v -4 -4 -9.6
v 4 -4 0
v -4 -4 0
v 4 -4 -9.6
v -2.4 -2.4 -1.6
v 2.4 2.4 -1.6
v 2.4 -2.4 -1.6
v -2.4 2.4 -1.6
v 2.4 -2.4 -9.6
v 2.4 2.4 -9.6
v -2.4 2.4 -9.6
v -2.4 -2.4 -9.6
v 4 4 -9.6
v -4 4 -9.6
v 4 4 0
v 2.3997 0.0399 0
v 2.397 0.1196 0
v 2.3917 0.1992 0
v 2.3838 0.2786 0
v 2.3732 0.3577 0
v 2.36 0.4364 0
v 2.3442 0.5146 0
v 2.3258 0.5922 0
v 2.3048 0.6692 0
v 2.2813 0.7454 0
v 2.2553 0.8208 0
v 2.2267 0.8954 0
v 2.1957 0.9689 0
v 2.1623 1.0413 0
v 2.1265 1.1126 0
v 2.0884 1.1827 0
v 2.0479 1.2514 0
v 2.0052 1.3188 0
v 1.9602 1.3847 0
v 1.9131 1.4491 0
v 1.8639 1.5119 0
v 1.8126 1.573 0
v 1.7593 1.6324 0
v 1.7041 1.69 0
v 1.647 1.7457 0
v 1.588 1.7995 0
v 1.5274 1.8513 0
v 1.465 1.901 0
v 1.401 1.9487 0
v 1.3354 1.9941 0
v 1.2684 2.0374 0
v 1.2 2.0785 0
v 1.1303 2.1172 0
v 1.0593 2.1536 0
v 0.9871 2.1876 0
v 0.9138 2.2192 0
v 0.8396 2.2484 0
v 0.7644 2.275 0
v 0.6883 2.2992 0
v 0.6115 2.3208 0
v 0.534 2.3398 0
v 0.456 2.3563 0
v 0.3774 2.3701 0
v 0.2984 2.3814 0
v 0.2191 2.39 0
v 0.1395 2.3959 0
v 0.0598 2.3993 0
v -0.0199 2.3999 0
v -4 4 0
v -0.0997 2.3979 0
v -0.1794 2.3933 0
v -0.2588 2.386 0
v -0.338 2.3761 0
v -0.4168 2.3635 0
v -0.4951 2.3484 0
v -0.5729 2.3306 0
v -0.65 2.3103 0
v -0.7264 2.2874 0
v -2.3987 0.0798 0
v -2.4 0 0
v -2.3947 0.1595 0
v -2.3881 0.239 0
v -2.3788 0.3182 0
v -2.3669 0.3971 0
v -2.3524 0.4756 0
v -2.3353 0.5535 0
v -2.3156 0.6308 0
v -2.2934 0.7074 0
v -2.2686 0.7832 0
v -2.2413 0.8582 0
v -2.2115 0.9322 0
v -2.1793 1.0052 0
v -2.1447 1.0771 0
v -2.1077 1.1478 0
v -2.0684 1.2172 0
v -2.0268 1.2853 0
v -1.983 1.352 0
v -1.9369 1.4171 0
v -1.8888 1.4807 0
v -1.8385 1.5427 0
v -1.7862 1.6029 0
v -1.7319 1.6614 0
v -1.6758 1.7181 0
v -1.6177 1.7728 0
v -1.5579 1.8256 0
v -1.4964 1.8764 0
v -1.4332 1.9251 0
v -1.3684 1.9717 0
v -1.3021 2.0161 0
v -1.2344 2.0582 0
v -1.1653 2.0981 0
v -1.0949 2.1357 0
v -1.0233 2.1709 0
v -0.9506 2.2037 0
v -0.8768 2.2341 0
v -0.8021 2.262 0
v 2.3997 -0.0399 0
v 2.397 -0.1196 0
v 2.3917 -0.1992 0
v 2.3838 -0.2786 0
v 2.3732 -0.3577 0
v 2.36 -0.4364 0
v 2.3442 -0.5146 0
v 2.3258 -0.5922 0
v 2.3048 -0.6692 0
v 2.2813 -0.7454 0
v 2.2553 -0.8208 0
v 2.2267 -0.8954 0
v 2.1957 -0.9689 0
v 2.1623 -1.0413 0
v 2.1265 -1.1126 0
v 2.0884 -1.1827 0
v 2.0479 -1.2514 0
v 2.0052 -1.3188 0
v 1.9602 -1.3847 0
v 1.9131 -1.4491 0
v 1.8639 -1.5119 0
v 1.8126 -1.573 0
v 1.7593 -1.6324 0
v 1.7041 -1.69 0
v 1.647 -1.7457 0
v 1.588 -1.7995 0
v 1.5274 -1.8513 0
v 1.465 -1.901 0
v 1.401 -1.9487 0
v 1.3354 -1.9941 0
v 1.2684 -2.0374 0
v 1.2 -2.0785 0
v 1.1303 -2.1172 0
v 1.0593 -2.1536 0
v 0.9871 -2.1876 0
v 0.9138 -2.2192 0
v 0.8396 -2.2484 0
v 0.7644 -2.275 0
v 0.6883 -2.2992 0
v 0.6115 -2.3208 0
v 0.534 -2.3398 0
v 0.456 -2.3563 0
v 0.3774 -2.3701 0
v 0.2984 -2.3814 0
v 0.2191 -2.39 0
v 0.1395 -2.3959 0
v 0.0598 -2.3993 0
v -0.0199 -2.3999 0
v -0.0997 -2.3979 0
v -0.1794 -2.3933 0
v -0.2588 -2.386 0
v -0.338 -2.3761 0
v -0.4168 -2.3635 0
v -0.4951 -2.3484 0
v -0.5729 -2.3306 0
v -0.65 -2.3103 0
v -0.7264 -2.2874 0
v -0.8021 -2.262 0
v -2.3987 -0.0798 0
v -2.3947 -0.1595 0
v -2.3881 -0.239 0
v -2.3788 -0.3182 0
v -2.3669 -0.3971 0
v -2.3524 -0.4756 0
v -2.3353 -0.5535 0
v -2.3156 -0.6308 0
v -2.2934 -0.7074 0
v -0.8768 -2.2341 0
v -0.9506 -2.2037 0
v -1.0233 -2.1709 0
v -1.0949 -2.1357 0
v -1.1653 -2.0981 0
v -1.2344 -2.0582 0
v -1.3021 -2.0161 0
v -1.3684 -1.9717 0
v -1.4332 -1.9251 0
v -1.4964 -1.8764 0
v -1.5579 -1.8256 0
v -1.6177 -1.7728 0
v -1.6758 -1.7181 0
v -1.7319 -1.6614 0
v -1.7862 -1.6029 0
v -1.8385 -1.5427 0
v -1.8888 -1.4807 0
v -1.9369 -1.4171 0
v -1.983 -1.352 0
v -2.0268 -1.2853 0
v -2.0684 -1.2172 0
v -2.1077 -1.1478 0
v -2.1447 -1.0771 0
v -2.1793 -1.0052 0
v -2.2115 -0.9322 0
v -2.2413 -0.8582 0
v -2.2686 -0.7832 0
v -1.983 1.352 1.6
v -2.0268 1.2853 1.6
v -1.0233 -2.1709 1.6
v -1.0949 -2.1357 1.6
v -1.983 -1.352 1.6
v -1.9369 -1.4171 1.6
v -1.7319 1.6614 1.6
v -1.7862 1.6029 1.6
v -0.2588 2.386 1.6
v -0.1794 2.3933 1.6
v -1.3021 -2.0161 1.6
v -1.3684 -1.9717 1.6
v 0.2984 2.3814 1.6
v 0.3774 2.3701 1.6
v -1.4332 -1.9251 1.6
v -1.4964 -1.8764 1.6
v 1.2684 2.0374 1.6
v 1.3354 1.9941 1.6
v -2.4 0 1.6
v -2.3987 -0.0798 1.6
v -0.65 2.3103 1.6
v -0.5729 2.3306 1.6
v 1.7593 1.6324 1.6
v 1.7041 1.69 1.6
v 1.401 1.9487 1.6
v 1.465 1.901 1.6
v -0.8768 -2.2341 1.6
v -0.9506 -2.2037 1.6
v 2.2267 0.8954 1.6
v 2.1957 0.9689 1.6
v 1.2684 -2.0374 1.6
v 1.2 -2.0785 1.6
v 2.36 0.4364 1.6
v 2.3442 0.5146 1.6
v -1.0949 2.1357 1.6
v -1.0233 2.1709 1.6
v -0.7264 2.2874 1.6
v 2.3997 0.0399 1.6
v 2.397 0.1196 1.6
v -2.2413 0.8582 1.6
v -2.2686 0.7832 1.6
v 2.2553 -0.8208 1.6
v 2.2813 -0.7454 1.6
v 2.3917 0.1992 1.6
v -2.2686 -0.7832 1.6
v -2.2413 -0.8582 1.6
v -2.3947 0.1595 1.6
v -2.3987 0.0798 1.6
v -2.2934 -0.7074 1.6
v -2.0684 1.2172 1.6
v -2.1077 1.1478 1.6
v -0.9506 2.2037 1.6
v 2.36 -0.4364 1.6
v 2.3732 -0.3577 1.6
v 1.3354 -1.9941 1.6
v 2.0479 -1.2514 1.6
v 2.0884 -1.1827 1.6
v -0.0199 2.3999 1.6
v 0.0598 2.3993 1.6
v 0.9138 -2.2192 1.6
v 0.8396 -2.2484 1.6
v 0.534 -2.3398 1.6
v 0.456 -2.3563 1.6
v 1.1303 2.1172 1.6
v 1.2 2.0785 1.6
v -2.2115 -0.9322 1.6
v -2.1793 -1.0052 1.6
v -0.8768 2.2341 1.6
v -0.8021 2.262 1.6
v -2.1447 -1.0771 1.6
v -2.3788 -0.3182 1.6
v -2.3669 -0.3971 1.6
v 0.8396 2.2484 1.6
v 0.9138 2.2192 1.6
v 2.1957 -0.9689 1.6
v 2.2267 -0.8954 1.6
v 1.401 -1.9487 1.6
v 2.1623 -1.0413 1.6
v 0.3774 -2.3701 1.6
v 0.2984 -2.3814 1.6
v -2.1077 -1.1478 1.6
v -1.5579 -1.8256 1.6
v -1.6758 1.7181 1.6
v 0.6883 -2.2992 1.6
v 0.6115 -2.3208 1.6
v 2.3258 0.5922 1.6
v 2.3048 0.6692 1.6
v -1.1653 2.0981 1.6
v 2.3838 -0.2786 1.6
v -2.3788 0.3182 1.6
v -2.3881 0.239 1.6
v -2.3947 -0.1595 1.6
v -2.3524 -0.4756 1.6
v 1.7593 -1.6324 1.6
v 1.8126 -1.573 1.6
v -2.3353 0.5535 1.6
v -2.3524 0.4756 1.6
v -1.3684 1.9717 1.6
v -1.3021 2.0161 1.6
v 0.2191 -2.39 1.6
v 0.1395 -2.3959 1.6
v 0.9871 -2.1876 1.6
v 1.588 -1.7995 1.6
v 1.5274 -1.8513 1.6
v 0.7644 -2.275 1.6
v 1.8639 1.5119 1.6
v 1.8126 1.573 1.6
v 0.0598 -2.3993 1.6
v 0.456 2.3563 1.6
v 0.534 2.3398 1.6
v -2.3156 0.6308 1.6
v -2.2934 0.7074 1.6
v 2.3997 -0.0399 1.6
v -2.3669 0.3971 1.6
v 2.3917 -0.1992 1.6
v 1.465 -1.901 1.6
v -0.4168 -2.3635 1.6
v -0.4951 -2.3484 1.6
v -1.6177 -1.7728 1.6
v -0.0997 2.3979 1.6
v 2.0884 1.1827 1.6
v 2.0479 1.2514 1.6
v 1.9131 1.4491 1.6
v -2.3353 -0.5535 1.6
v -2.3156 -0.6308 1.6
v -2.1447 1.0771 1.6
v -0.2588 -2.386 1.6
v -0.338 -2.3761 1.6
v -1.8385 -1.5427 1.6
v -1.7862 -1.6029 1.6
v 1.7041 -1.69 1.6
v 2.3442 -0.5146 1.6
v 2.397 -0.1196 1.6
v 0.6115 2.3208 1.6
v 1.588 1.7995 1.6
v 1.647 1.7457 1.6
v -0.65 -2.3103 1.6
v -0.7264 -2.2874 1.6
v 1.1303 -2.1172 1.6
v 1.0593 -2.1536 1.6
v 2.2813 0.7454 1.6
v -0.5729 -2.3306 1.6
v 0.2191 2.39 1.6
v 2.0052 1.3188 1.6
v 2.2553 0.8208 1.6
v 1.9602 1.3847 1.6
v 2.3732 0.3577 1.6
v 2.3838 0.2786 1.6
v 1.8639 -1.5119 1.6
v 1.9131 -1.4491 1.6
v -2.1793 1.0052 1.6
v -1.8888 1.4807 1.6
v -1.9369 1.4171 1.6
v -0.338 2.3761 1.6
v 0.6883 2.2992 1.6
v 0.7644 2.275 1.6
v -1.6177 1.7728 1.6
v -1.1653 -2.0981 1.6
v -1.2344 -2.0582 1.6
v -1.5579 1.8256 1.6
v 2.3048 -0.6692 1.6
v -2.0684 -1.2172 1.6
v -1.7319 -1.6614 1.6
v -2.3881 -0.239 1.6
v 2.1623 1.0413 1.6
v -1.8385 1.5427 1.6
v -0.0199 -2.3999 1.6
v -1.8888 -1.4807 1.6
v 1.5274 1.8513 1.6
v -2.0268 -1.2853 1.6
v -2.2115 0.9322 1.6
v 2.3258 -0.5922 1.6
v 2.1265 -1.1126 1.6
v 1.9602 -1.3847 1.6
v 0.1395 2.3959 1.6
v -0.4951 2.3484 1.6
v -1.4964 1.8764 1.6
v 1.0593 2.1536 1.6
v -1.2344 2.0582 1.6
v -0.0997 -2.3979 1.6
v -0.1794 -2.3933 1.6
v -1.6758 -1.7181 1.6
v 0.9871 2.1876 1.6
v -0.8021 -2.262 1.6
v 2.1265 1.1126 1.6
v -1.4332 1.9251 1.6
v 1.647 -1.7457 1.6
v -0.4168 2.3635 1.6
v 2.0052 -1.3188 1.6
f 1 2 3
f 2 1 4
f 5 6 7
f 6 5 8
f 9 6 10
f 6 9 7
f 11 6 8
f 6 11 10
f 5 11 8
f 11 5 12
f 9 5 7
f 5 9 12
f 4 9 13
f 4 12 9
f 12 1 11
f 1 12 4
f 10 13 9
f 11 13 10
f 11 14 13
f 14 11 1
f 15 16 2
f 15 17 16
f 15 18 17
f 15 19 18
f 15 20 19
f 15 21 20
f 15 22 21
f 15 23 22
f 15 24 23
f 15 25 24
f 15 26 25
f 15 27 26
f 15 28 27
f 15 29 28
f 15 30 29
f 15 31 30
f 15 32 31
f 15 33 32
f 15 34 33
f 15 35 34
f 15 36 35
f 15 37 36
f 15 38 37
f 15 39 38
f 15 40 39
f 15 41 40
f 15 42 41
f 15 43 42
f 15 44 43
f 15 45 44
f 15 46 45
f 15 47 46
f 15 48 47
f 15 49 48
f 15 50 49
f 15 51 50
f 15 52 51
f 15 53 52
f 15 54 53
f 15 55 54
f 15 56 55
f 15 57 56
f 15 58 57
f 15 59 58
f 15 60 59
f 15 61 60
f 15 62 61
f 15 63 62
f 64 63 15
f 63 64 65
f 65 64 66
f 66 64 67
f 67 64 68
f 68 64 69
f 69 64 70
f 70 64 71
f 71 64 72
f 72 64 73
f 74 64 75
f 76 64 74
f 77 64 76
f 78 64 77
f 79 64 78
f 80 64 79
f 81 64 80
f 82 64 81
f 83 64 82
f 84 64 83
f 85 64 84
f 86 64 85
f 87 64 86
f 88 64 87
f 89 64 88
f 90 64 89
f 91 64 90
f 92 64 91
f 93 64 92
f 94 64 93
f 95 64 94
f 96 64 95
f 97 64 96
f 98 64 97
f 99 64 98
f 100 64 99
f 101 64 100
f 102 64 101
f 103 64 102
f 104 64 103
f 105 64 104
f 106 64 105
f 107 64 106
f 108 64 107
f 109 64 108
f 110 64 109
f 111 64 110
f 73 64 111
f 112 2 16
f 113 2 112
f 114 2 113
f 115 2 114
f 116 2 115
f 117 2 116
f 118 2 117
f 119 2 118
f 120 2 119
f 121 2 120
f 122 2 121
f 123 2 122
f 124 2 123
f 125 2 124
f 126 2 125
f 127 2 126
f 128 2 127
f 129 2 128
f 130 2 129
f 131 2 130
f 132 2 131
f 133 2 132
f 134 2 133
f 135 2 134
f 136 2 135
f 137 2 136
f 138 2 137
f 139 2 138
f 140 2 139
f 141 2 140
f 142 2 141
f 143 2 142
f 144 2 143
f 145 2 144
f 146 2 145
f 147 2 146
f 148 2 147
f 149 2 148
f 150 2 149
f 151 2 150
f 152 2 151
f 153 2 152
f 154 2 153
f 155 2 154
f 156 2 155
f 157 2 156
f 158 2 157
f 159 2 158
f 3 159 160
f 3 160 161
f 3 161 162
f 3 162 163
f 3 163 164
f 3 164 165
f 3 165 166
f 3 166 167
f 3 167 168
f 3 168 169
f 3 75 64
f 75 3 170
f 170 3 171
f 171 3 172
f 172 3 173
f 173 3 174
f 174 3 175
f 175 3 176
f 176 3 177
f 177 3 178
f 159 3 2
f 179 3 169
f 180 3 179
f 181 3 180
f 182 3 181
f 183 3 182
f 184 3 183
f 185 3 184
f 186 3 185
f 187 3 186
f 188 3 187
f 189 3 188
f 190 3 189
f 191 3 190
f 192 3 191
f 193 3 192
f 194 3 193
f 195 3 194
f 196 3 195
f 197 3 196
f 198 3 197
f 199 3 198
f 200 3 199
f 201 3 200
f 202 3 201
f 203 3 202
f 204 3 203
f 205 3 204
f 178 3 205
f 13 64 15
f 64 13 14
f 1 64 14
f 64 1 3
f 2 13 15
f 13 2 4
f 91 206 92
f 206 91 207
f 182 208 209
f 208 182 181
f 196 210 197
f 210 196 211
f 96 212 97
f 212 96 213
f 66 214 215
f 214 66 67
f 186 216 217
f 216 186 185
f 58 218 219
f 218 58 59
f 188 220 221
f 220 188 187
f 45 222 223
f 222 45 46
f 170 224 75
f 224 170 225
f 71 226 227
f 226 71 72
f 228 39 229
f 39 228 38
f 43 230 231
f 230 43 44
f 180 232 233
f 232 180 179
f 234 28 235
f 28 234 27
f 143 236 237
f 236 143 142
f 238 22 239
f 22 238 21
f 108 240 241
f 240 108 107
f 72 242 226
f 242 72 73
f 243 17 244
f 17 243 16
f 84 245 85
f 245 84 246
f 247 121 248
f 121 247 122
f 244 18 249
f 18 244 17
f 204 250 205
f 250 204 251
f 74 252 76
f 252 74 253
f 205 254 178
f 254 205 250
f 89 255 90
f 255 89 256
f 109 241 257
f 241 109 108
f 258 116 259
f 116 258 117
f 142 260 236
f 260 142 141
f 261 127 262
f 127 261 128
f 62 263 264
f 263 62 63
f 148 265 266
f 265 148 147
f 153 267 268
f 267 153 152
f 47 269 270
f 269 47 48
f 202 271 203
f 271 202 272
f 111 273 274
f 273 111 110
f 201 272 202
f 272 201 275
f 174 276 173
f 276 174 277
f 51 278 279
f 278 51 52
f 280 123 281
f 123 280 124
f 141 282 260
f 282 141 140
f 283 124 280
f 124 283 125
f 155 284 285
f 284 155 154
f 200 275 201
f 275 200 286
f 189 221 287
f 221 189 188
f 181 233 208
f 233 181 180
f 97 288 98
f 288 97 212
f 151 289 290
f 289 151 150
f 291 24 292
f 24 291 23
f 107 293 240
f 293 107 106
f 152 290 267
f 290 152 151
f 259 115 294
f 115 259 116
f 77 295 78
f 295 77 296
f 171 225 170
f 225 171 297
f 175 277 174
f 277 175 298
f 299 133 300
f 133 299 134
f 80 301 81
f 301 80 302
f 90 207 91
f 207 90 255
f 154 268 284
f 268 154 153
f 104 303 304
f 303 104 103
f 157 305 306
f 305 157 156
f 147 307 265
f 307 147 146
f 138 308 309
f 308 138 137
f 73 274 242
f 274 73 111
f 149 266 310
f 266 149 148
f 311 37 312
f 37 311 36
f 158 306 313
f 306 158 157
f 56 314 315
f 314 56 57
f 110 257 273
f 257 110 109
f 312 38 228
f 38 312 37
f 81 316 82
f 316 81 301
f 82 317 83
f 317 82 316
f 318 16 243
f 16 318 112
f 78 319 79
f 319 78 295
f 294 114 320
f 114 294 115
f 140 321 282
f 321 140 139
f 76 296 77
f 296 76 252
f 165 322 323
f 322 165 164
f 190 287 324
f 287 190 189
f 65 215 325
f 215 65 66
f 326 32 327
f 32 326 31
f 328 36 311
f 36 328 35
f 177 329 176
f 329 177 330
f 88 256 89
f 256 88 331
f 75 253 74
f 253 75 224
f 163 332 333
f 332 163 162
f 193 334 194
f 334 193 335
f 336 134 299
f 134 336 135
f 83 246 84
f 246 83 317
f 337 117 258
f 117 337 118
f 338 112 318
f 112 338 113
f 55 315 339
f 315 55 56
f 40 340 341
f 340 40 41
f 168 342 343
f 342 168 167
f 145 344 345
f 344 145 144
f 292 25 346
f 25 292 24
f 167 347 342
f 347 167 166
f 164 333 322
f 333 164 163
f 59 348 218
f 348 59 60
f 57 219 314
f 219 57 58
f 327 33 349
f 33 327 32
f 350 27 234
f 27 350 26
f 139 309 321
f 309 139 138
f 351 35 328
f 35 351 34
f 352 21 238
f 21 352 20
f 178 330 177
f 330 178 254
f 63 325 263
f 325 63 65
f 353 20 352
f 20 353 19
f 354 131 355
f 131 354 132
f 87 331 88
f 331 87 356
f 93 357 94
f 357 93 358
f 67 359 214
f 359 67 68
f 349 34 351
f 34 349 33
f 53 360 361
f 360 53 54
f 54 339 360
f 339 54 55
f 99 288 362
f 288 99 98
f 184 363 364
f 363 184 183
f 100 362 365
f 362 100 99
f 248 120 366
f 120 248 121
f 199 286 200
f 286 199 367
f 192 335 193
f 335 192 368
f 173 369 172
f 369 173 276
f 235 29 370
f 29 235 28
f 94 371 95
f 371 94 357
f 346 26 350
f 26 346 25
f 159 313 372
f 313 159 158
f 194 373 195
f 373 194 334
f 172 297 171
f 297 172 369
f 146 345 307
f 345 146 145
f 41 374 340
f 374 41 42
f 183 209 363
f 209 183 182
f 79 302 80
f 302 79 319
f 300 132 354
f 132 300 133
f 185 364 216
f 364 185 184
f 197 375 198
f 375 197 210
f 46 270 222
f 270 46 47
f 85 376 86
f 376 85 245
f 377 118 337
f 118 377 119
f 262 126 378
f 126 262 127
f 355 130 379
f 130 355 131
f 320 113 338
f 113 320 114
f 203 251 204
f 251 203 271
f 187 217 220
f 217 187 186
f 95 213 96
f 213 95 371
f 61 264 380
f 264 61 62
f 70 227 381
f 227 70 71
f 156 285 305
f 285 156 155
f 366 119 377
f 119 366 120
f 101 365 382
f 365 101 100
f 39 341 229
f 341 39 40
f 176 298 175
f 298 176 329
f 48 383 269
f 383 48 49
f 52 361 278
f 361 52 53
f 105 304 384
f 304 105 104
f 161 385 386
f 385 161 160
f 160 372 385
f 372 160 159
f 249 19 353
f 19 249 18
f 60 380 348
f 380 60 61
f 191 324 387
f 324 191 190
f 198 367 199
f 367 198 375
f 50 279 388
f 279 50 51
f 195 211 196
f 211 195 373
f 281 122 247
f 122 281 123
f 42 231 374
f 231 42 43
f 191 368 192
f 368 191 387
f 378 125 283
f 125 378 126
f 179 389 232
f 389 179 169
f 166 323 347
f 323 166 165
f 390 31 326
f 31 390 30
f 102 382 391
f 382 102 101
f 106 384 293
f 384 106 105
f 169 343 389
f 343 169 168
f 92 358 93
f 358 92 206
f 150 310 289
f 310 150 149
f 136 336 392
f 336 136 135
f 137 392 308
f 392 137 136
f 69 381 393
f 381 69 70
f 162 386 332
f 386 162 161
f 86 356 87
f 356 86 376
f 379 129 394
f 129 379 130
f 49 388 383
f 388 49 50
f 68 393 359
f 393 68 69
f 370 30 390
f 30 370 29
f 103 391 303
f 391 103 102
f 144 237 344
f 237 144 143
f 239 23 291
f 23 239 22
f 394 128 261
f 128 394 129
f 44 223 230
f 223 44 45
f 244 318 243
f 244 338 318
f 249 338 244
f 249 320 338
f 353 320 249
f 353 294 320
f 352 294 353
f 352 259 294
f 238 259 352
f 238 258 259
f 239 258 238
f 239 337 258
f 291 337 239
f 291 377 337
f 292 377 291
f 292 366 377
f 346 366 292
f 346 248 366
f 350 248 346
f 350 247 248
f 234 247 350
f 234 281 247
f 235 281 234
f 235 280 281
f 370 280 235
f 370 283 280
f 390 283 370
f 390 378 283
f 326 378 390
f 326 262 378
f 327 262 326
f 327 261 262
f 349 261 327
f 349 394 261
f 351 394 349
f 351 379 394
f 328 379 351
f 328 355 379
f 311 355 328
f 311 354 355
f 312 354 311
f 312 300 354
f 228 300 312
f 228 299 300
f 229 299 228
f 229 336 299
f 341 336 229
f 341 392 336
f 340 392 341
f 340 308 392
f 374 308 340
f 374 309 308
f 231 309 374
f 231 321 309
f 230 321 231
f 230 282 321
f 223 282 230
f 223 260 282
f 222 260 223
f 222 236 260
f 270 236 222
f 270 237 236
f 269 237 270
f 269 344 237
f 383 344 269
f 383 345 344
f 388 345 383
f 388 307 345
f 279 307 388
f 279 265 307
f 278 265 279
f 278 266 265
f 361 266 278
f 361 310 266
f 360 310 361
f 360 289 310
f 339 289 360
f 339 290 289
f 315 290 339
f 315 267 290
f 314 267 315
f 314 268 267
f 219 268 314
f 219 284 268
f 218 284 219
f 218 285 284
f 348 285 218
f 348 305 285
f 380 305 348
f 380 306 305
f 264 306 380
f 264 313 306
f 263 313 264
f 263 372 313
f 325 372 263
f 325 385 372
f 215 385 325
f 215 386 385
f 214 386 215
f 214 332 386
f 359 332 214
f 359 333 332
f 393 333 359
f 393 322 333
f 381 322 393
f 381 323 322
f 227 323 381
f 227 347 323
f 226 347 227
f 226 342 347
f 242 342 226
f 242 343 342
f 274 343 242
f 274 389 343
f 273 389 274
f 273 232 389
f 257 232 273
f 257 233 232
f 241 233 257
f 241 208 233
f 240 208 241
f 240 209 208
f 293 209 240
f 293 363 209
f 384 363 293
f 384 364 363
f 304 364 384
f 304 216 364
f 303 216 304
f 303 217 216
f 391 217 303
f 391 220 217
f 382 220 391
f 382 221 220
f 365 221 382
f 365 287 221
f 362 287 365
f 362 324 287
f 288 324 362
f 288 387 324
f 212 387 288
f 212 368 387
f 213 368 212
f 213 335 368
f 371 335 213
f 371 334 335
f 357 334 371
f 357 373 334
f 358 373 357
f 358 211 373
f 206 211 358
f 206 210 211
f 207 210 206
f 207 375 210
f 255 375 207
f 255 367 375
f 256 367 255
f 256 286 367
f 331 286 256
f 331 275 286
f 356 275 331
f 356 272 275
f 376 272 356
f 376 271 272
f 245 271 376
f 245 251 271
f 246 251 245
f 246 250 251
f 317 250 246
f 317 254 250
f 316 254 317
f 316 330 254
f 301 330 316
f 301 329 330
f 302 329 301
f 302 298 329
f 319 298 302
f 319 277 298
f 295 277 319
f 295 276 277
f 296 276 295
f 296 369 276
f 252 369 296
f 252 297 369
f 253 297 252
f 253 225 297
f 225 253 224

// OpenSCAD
// file: ../p/stud3.scad
use <../lib.scad>
use <4-4cyli.scad>
use <4-4disc.scad>
use <4-4edge.scad>
$fa=1; $fs=0.2;
function ldraw_lib__stud3(realsolid=false) = realsolid ? 
    [openscad(translate([0,0,-eps()], o=cylinder(4+eps(), r=4)),2)] : [
// 0 Stud Tube Solid
// 0 Name: stud3.dat
// 0 Author: James Jessiman
// 0 !LDRAW_ORG Primitive UPDATE 2012-01
// 0 !LICENSE Licensed under CC BY 2.0 and CC BY 4.0 : see CAreadme.txt
// 
// 0 BFC CERTIFY CCW
  [0,"BFC","CERTIFY"],
  [0,"BFC","CCW"],
// 
// 0 !HISTORY 2002-04-04 [sbliss] Modified for BFC compliance
// 0 !HISTORY 2002-04-25 [PTadmin] Official Update 2002-02
// 0 !HISTORY 2007-06-24 [PTadmin] Header formatted for Contributor Agreement
// 0 !HISTORY 2008-07-01 [PTadmin] Official Update 2008-01
// 0 !HISTORY 2012-02-16 [Philo] Changed to CCW
// 0 !HISTORY 2012-03-30 [PTadmin] Official Update 2012-01
// 
// 
// 1 16 0 -4 0 4 0 0 0 1 0 0 0 4 4-4edge.dat
  [1,16,0,-4,0,4,0,0,0,1,0,0,0,4, ldraw_lib__4_4edge(realsolid)],
// 1 16 0 0 0 4 0 0 0 1 0 0 0 4 4-4edge.dat
  [1,16,0,0,0,4,0,0,0,1,0,0,0,4, ldraw_lib__4_4edge(realsolid)],
// 1 16 0 -4 0 4 0 0 0 1 0 0 0 4 4-4disc.dat
  [1,16,0,-4,0,4,0,0,0,1,0,0,0,4, ldraw_lib__4_4disc(realsolid)],
// 1 16 0 -4 0 4 0 0 0 4 0 0 0 4 4-4cyli.dat
  [1,16,0,-4,0,4,0,0,0,4,0,0,0,4, ldraw_lib__4_4cyli(realsolid)],
];
module ldraw_lib__stud3(step=0, col=false, unit=2/5, alt=false, line=0.2, solid=!$preview)
    makepoly(ldraw_lib__stud3(solid), step=step, col=col, unit=unit, alt=alt, line=line, solid=solid);
ldraw_lib__stud3(line=0.2);
// file: ../p/4-4edge.scad
use <../lib.scad>
$fa=1; $fs=0.2;
function ldraw_lib__4_4edge(realsolid=false) = [
// 0 Circle 1.0
// 0 Name: 4-4edge.dat
// 0 Author: James Jessiman
// 0 !LDRAW_ORG Primitive UPDATE 2017-01
// 0 !LICENSE Licensed under CC BY 2.0 and CC BY 4.0 : see CAreadme.txt
// 
// 0 BFC CERTIFY CCW
  [0,"BFC","CERTIFY"],
  [0,"BFC","CCW"],
// 
// 0 !HISTORY 1998-12-15 [PTadmin] Official Update 1998-10
// 0 !HISTORY 2005-12-28 [PTadmin] Official Update 2005-01
// 0 !HISTORY 2007-06-24 [PTadmin] Header formatted for Contributor Agreement
// 0 !HISTORY 2008-07-01 [PTadmin] Official Update 2008-01
// 0 !HISTORY 2017-01-15 [Steffen] BFCed
// 0 !HISTORY 2017-12-30 [PTadmin] Official Update 2017-01
// 
// 
// 2 24 1 0 0 0.9239 0 0.3827
  [2,24,1,0,0,0.9239,0,0.3827],
// 2 24 0.9239 0 0.3827 0.7071 0 0.7071
  [2,24,0.9239,0,0.3827,0.7071,0,0.7071],
// 2 24 0.7071 0 0.7071 0.3827 0 0.9239
  [2,24,0.7071,0,0.7071,0.3827,0,0.9239],
// 2 24 0.3827 0 0.9239 0 0 1
  [2,24,0.3827,0,0.9239,0,0,1],
// 2 24 0 0 1 -0.3827 0 0.9239
  [2,24,0,0,1,-0.3827,0,0.9239],
// 2 24 -0.3827 0 0.9239 -0.7071 0 0.7071
  [2,24,-0.3827,0,0.9239,-0.7071,0,0.7071],
// 2 24 -0.7071 0 0.7071 -0.9239 0 0.3827
  [2,24,-0.7071,0,0.7071,-0.9239,0,0.3827],
// 2 24 -0.9239 0 0.3827 -1 0 -0
  [2,24,-0.9239,0,0.3827,-1,0,-0],
// 2 24 -1 0 -0 -0.9239 0 -0.3827
  [2,24,-1,0,-0,-0.9239,0,-0.3827],
// 2 24 -0.9239 0 -0.3827 -0.7071 0 -0.7071
  [2,24,-0.9239,0,-0.3827,-0.7071,0,-0.7071],
// 2 24 -0.7071 0 -0.7071 -0.3827 0 -0.9239
  [2,24,-0.7071,0,-0.7071,-0.3827,0,-0.9239],
// 2 24 -0.3827 0 -0.9239 0 0 -1
  [2,24,-0.3827,0,-0.9239,0,0,-1],
// 2 24 0 0 -1 0.3827 0 -0.9239
  [2,24,0,0,-1,0.3827,0,-0.9239],
// 2 24 0.3827 0 -0.9239 0.7071 0 -0.7071
  [2,24,0.3827,0,-0.9239,0.7071,0,-0.7071],
// 2 24 0.7071 0 -0.7071 0.9239 0 -0.3827
  [2,24,0.7071,0,-0.7071,0.9239,0,-0.3827],
// 2 24 0.9239 0 -0.3827 1 0 0
  [2,24,0.9239,0,-0.3827,1,0,0],
];
module ldraw_lib__4_4edge(step=0, col=false, unit=2/5, alt=false, line=0.2, solid=!$preview)
    makepoly(ldraw_lib__4_4edge(solid), step=step, col=col, unit=unit, alt=alt, line=line, solid=solid);
ldraw_lib__4_4edge(line=0.2);
// file: ../p/4-4disc.scad
use <../lib.scad>
$fa=1; $fs=0.2;
function ldraw_lib__4_4disc(realsolid=false) = [
// 0 Disc 1.0
// 0 Name: 4-4disc.dat
// 0 Author: James Jessiman
// 0 !LDRAW_ORG Primitive UPDATE 2002-02
// 0 !LICENSE Licensed under CC BY 2.0 and CC BY 4.0 : see CAreadme.txt
// 
// 0 BFC CERTIFY CCW
  [0,"BFC","CERTIFY"],
  [0,"BFC","CCW"],
// 
// 0 !HISTORY 1998-12-15 [PTadmin] Official Update 1998-10
// 0 !HISTORY 2002-03-23 [sbliss] Added BFC statement
// 0 !HISTORY 2002-04-25 [PTadmin] Official Update 2002-02
// 0 !HISTORY 2007-06-24 [PTadmin] Header formatted for Contributor Agreement
// 0 !HISTORY 2008-07-01 [PTadmin] Official Update 2008-01
// 
// 
// 3 16 0 0 0 1 0 0 0.9239 0 0.3827
  [3,16,0,0,0,1,0,0,0.9239,0,0.3827],
// 3 16 0 0 0 0.9239 0 0.3827 0.7071 0 0.7071
  [3,16,0,0,0,0.9239,0,0.3827,0.7071,0,0.7071],
// 3 16 0 0 0 0.7071 0 0.7071 0.3827 0 0.9239
  [3,16,0,0,0,0.7071,0,0.7071,0.3827,0,0.9239],
// 3 16 0 0 0 0.3827 0 0.9239 0 0 1
  [3,16,0,0,0,0.3827,0,0.9239,0,0,1],
// 3 16 0 0 0 0 0 1 -0.3827 0 0.9239
  [3,16,0,0,0,0,0,1,-0.3827,0,0.9239],
// 3 16 0 0 0 -0.3827 0 0.9239 -0.7071 0 0.7071
  [3,16,0,0,0,-0.3827,0,0.9239,-0.7071,0,0.7071],
// 3 16 0 0 0 -0.7071 0 0.7071 -0.9239 0 0.3827
  [3,16,0,0,0,-0.7071,0,0.7071,-0.9239,0,0.3827],
// 3 16 0 0 0 -0.9239 0 0.3827 -1 0 -0
  [3,16,0,0,0,-0.9239,0,0.3827,-1,0,-0],
// 3 16 0 0 0 -1 0 -0 -0.9239 0 -0.3827
  [3,16,0,0,0,-1,0,-0,-0.9239,0,-0.3827],
// 3 16 0 0 0 -0.9239 0 -0.3827 -0.7071 0 -0.7071
  [3,16,0,0,0,-0.9239,0,-0.3827,-0.7071,0,-0.7071],
// 3 16 0 0 0 -0.7071 0 -0.7071 -0.3827 0 -0.9239
  [3,16,0,0,0,-0.7071,0,-0.7071,-0.3827,0,-0.9239],
// 3 16 0 0 0 -0.3827 0 -0.9239 0 0 -1
  [3,16,0,0,0,-0.3827,0,-0.9239,0,0,-1],
// 3 16 0 0 0 0 0 -1 0.3827 0 -0.9239
  [3,16,0,0,0,0,0,-1,0.3827,0,-0.9239],
// 3 16 0 0 0 0.3827 0 -0.9239 0.7071 0 -0.7071
  [3,16,0,0,0,0.3827,0,-0.9239,0.7071,0,-0.7071],
// 3 16 0 0 0 0.7071 0 -0.7071 0.9239 0 -0.3827
  [3,16,0,0,0,0.7071,0,-0.7071,0.9239,0,-0.3827],
// 3 16 0 0 0 0.9239 0 -0.3827 1 0 0
  [3,16,0,0,0,0.9239,0,-0.3827,1,0,0],
// 0
];
module ldraw_lib__4_4disc(step=0, col=false, unit=2/5, alt=false, line=0.2, solid=!$preview)
    makepoly(ldraw_lib__4_4disc(solid), step=step, col=col, unit=unit, alt=alt, line=line, solid=solid);
ldraw_lib__4_4disc(line=0.2);
// file: ../p/4-4cyli.scad
use <../lib.scad>
$fa=1; $fs=0.2;
function ldraw_lib__4_4cyli(realsolid=false) = [
// 0 Cylinder 1.0
// 0 Name: 4-4cyli.dat
// 0 Author: James Jessiman
// 0 !LDRAW_ORG Primitive UPDATE 2005-01
// 0 !LICENSE Licensed under CC BY 2.0 and CC BY 4.0 : see CAreadme.txt
// 
// 0 BFC CERTIFY CCW
  [0,"BFC","CERTIFY"],
  [0,"BFC","CCW"],
// 
// 0 !HISTORY 1998-12-15 [PTadmin] Official Update 1998-10
// 0 !HISTORY 2002-03-23 [sbliss] Added BFC statement; merged headers from files in distributions LDraw 0.27 and Complete.
// 0 !HISTORY 2002-04-25 [PTadmin] Official Update 2002-02
// 0 !HISTORY 2004-12-14 [guyvivan] BFC CCW
// 0 !HISTORY 2005-12-28 [PTadmin] Official Update 2005-01
// 0 !HISTORY 2007-06-24 [PTadmin] Header formatted for Contributor Agreement
// 0 !HISTORY 2008-07-01 [PTadmin] Official Update 2008-01
// 
// 
// 4 16 1 1 0 0.9239 1 0.3827 0.9239 0 0.3827 1 0 0
  [4,16,1,1,0,0.9239,1,0.3827,0.9239,0,0.3827,1,0,0],
// 5 24 1 0 0 1 1 0 0.9239 0 0.3827 0.9239 0 -0.3827
  [5,24,1,0,0,1,1,0,0.9239,0,0.3827,0.9239,0,-0.3827],
// 4 16 0.9239 1 0.3827 0.7071 1 0.7071 0.7071 0 0.7071 0.9239 0 0.3827
  [4,16,0.9239,1,0.3827,0.7071,1,0.7071,0.7071,0,0.7071,0.9239,0,0.3827],
// 5 24 0.9239 0 0.3827 0.9239 1 0.3827 0.7071 0 0.7071 1 0 0
  [5,24,0.9239,0,0.3827,0.9239,1,0.3827,0.7071,0,0.7071,1,0,0],
// 4 16 0.7071 1 0.7071 0.3827 1 0.9239 0.3827 0 0.9239 0.7071 0 0.7071
  [4,16,0.7071,1,0.7071,0.3827,1,0.9239,0.3827,0,0.9239,0.7071,0,0.7071],
// 5 24 0.7071 0 0.7071 0.7071 1 0.7071 0.3827 0 0.9239 0.9239 0 0.3827
  [5,24,0.7071,0,0.7071,0.7071,1,0.7071,0.3827,0,0.9239,0.9239,0,0.3827],
// 4 16 0.3827 1 0.9239 0 1 1 0 0 1 0.3827 0 0.9239
  [4,16,0.3827,1,0.9239,0,1,1,0,0,1,0.3827,0,0.9239],
// 5 24 0.3827 0 0.9239 0.3827 1 0.9239 0 0 1 0.7071 0 0.7071
  [5,24,0.3827,0,0.9239,0.3827,1,0.9239,0,0,1,0.7071,0,0.7071],
// 4 16 0 1 1 -0.3827 1 0.9239 -0.3827 0 0.9239 0 0 1
  [4,16,0,1,1,-0.3827,1,0.9239,-0.3827,0,0.9239,0,0,1],
// 5 24 0 0 1 0 1 1 -0.3827 0 0.9239 0.3827 0 0.9239
  [5,24,0,0,1,0,1,1,-0.3827,0,0.9239,0.3827,0,0.9239],
// 4 16 -0.3827 1 0.9239 -0.7071 1 0.7071 -0.7071 0 0.7071 -0.3827 0 0.9239
  [4,16,-0.3827,1,0.9239,-0.7071,1,0.7071,-0.7071,0,0.7071,-0.3827,0,0.9239],
// 5 24 -0.3827 0 0.9239 -0.3827 1 0.9239 -0.7071 0 0.7071 0 0 1
  [5,24,-0.3827,0,0.9239,-0.3827,1,0.9239,-0.7071,0,0.7071,0,0,1],
// 4 16 -0.7071 1 0.7071 -0.9239 1 0.3827 -0.9239 0 0.3827 -0.7071 0 0.7071
  [4,16,-0.7071,1,0.7071,-0.9239,1,0.3827,-0.9239,0,0.3827,-0.7071,0,0.7071],
// 5 24 -0.7071 0 0.7071 -0.7071 1 0.7071 -0.9239 0 0.3827 -0.3827 0 0.9239
  [5,24,-0.7071,0,0.7071,-0.7071,1,0.7071,-0.9239,0,0.3827,-0.3827,0,0.9239],
// 4 16 -0.9239 1 0.3827 -1 1 0 -1 0 0 -0.9239 0 0.3827
  [4,16,-0.9239,1,0.3827,-1,1,0,-1,0,0,-0.9239,0,0.3827],
// 5 24 -0.9239 0 0.3827 -0.9239 1 0.3827 -1 0 0 -0.7071 0 0.7071
  [5,24,-0.9239,0,0.3827,-0.9239,1,0.3827,-1,0,0,-0.7071,0,0.7071],
// 4 16 -1 1 0 -0.9239 1 -0.3827 -0.9239 0 -0.3827 -1 0 0
  [4,16,-1,1,0,-0.9239,1,-0.3827,-0.9239,0,-0.3827,-1,0,0],
// 5 24 -1 0 0 -1 1 0 -0.9239 0 -0.3827 -0.9239 0 0.3827
  [5,24,-1,0,0,-1,1,0,-0.9239,0,-0.3827,-0.9239,0,0.3827],
// 4 16 -0.9239 1 -0.3827 -0.7071 1 -0.7071 -0.7071 0 -0.7071 -0.9239 0 -0.3827
  [4,16,-0.9239,1,-0.3827,-0.7071,1,-0.7071,-0.7071,0,-0.7071,-0.9239,0,-0.3827],
// 5 24 -0.9239 0 -0.3827 -0.9239 1 -0.3827 -0.7071 0 -0.7071 -1 0 0
  [5,24,-0.9239,0,-0.3827,-0.9239,1,-0.3827,-0.7071,0,-0.7071,-1,0,0],
// 4 16 -0.7071 1 -0.7071 -0.3827 1 -0.9239 -0.3827 0 -0.9239 -0.7071 0 -0.7071
  [4,16,-0.7071,1,-0.7071,-0.3827,1,-0.9239,-0.3827,0,-0.9239,-0.7071,0,-0.7071],
// 5 24 -0.7071 0 -0.7071 -0.7071 1 -0.7071 -0.3827 0 -0.9239 -0.9239 0 -0.3827
  [5,24,-0.7071,0,-0.7071,-0.7071,1,-0.7071,-0.3827,0,-0.9239,-0.9239,0,-0.3827],
// 4 16 -0.3827 1 -0.9239 0 1 -1 0 0 -1 -0.3827 0 -0.9239
  [4,16,-0.3827,1,-0.9239,0,1,-1,0,0,-1,-0.3827,0,-0.9239],
// 5 24 -0.3827 0 -0.9239 -0.3827 1 -0.9239 0 0 -1 -0.7071 0 -0.7071
  [5,24,-0.3827,0,-0.9239,-0.3827,1,-0.9239,0,0,-1,-0.7071,0,-0.7071],
// 4 16 0 1 -1 0.3827 1 -0.9239 0.3827 0 -0.9239 0 0 -1
  [4,16,0,1,-1,0.3827,1,-0.9239,0.3827,0,-0.9239,0,0,-1],
// 5 24 0 0 -1 0 1 -1 0.3827 0 -0.9239 -0.3827 0 -0.9239
  [5,24,0,0,-1,0,1,-1,0.3827,0,-0.9239,-0.3827,0,-0.9239],
// 4 16 0.3827 1 -0.9239 0.7071 1 -0.7071 0.7071 0 -0.7071 0.3827 0 -0.9239
  [4,16,0.3827,1,-0.9239,0.7071,1,-0.7071,0.7071,0,-0.7071,0.3827,0,-0.9239],
// 5 24 0.3827 0 -0.9239 0.3827 1 -0.9239 0.7071 0 -0.7071 0 0 -1
  [5,24,0.3827,0,-0.9239,0.3827,1,-0.9239,0.7071,0,-0.7071,0,0,-1],
// 4 16 0.7071 1 -0.7071 0.9239 1 -0.3827 0.9239 0 -0.3827 0.7071 0 -0.7071
  [4,16,0.7071,1,-0.7071,0.9239,1,-0.3827,0.9239,0,-0.3827,0.7071,0,-0.7071],
// 5 24 0.7071 0 -0.7071 0.7071 1 -0.7071 0.9239 0 -0.3827 0.3827 0 -0.9239
  [5,24,0.7071,0,-0.7071,0.7071,1,-0.7071,0.9239,0,-0.3827,0.3827,0,-0.9239],
// 4 16 0.9239 1 -0.3827 1 1 0 1 0 0 0.9239 0 -0.3827
  [4,16,0.9239,1,-0.3827,1,1,0,1,0,0,0.9239,0,-0.3827],
// 5 24 0.9239 0 -0.3827 0.9239 1 -0.3827 1 0 0 0.7071 0 -0.7071
  [5,24,0.9239,0,-0.3827,0.9239,1,-0.3827,1,0,0,0.7071,0,-0.7071],
// 0
];
module ldraw_lib__4_4cyli(step=0, col=false, unit=2/5, alt=false, line=0.2, solid=!$preview)
    makepoly(ldraw_lib__4_4cyli(solid), step=step, col=col, unit=unit, alt=alt, line=line, solid=solid);
ldraw_lib__4_4cyli(line=0.2);
// file: s/3004s01.scad
use <../../lib.scad>
use <../../p/box4t.scad>
use <../../p/box5.scad>
use <../../p/stud.scad>
use <../../p/stud3.scad>
$fa=1; $fs=0.2;
function ldraw_lib__s__3004s01(realsolid=false) = [
// 0 ~Brick  1 x  2 without Front Face
// 0 Name: s\3004s01.dat
// 0 Author: James Jessiman
// 0 !LDRAW_ORG Subpart UPDATE 2003-03
// 0 !LICENSE Licensed under CC BY 2.0 and CC BY 4.0 : see CAreadme.txt
// 
// 0 BFC CERTIFY CCW
  [0,"BFC","CERTIFY"],
  [0,"BFC","CCW"],
// 
// 0 !HISTORY 2003-09-07 [jriley] Subfiling, BFC
// 0 !HISTORY 2003-12-19 [PTadmin] Official Update 2003-03
// 0 !HISTORY 2007-08-29 [PTadmin] Header formatted for Contributor Agreement
// 0 !HISTORY 2008-07-01 [PTadmin] Official Update 2008-01
// 
// 
// 1 16 0 4 0 1 0 0 0 -5 0 0 0 1 stud3.dat
  [1,16,0,4,0,1,0,0,0,-5,0,0,0,1, ldraw_lib__stud3(realsolid)],
// 0 BFC INVERTNEXT
  [0,"BFC","INVERTNEXT"],
// 1 16 0 24 0 16 0 0 0 -20 0 0 0 6 box5.dat
  [1,16,0,24,0,16,0,0,0,-20,0,0,0,6, ldraw_lib__box5(realsolid)],
// 4 16 20 24 10 16 24 6 -16 24 6 -20 24 10
  [4,16,20,24,10,16,24,6,-16,24,6,-20,24,10],
// 4 16 -20 24 10 -16 24 6 -16 24 -6 -20 24 -10
  [4,16,-20,24,10,-16,24,6,-16,24,-6,-20,24,-10],
// 4 16 -20 24 -10 -16 24 -6 16 24 -6 20 24 -10
  [4,16,-20,24,-10,-16,24,-6,16,24,-6,20,24,-10],
// 4 16 20 24 -10 16 24 -6 16 24 6 20 24 10
  [4,16,20,24,-10,16,24,-6,16,24,6,20,24,10],
// 1 16 0 24 0 20 0 0 0 -24 0 0 0 10 box4t.dat
  [1,16,0,24,0,20,0,0,0,-24,0,0,0,10, ldraw_lib__box4t(realsolid)],
// 1 16 10 0 0 1 0 0 0 1 0 0 0 1 stud.dat
  [1,16,10,0,0,1,0,0,0,1,0,0,0,1, ldraw_lib__stud(realsolid)],
// 1 16 -10 0 0 1 0 0 0 1 0 0 0 1 stud.dat
  [1,16,-10,0,0,1,0,0,0,1,0,0,0,1, ldraw_lib__stud(realsolid)],
// 0
];
module ldraw_lib__s__3004s01(step=0, col=false, unit=2/5, alt=false, line=0.2, solid=!$preview)
    makepoly(ldraw_lib__s__3004s01(solid), step=step, col=col, unit=unit, alt=alt, line=line, solid=solid);
ldraw_lib__s__3004s01(line=0.2);
// file: ../p/stud.scad
use <../lib.scad>
use <4-4cyli.scad>
use <4-4disc.scad>
use <4-4edge.scad>
$fa=1; $fs=0.2;
function ldraw_lib__stud(realsolid=false) = realsolid ? 
    [openscad(translate([0,0,-eps()], o=cylinder(4+eps(), r=6)),2)] : [
// 0 Stud
// 0 Name: stud.dat
// 0 Author: James Jessiman
// 0 !LDRAW_ORG Primitive UPDATE 2012-01
// 0 !LICENSE Licensed under CC BY 2.0 and CC BY 4.0 : see CAreadme.txt
// 
// 0 BFC CERTIFY CCW
  [0,"BFC","CERTIFY"],
  [0,"BFC","CCW"],
// 
// 0 !HISTORY 2002-04-04 [sbliss] Modified for BFC compliance
// 0 !HISTORY 2002-04-25 [PTadmin] Official Update 2002-02
// 0 !HISTORY 2007-06-24 [PTadmin] Header formatted for Contributor Agreement
// 0 !HISTORY 2008-07-01 [PTadmin] Official Update 2008-01
// 0 !HISTORY 2012-02-16 [Philo] Changed to CCW
// 0 !HISTORY 2012-03-30 [PTadmin] Official Update 2012-01
// 
// 
// 1 16 0 0 0 6 0 0 0 1 0 0 0 6 4-4edge.dat
  [1,16,0,0,0,6,0,0,0,1,0,0,0,6, ldraw_lib__4_4edge(realsolid)],
// 1 16 0 -4 0 6 0 0 0 1 0 0 0 6 4-4edge.dat
  [1,16,0,-4,0,6,0,0,0,1,0,0,0,6, ldraw_lib__4_4edge(realsolid)],
// 1 16 0 0 0 6 0 0 0 -4 0 0 0 6 4-4cyli.dat
  [1,16,0,0,0,6,0,0,0,-4,0,0,0,6, ldraw_lib__4_4cyli(realsolid)],
// 1 16 0 -4 0 6 0 0 0 1 0 0 0 6 4-4disc.dat
  [1,16,0,-4,0,6,0,0,0,1,0,0,0,6, ldraw_lib__4_4disc(realsolid)],
];
module ldraw_lib__stud(step=0, col=false, unit=2/5, alt=false, line=0.2, solid=!$preview)
    makepoly(ldraw_lib__stud(solid), step=step, col=col, unit=unit, alt=alt, line=line, solid=solid);
ldraw_lib__stud(line=0.2);
// file: ../p/box5.scad
use <../lib.scad>
$fa=1; $fs=0.2;
function ldraw_lib__box5(realsolid=false) = [
// 0 Box with 5 Faces and All Edges
// 0 Name: box5.dat
// 0 Author: James Jessiman
// 0 !LDRAW_ORG Primitive UPDATE 2012-01
// 0 !LICENSE Licensed under CC BY 2.0 and CC BY 4.0 : see CAreadme.txt
// 
// 0 BFC CERTIFY CCW
  [0,"BFC","CERTIFY"],
  [0,"BFC","CCW"],
// 
// 0 !HISTORY 2002-04-03 [sbliss] Modified for BFC compliance
// 0 !HISTORY 2002-04-25 [PTadmin] Official Update 2002-02
// 0 !HISTORY 2007-06-24 [PTadmin] Header formatted for Contributor Agreement
// 0 !HISTORY 2008-07-01 [PTadmin] Official Update 2008-01
// 0 !HISTORY 2012-02-16 [Philo] Changed to CCW
// 0 !HISTORY 2012-03-30 [PTadmin] Official Update 2012-01
// 
// 
// 2 24 1 1 1 -1 1 1
  [2,24,1,1,1,-1,1,1],
// 2 24 -1 1 1 -1 1 -1
  [2,24,-1,1,1,-1,1,-1],
// 2 24 -1 1 -1 1 1 -1
  [2,24,-1,1,-1,1,1,-1],
// 2 24 1 1 -1 1 1 1
  [2,24,1,1,-1,1,1,1],
// 2 24 1 0 1 -1 0 1
  [2,24,1,0,1,-1,0,1],
// 2 24 -1 0 1 -1 0 -1
  [2,24,-1,0,1,-1,0,-1],
// 2 24 -1 0 -1 1 0 -1
  [2,24,-1,0,-1,1,0,-1],
// 2 24 1 0 -1 1 0 1
  [2,24,1,0,-1,1,0,1],
// 2 24 1 0 1 1 1 1
  [2,24,1,0,1,1,1,1],
// 2 24 -1 0 1 -1 1 1
  [2,24,-1,0,1,-1,1,1],
// 2 24 1 0 -1 1 1 -1
  [2,24,1,0,-1,1,1,-1],
// 2 24 -1 0 -1 -1 1 -1
  [2,24,-1,0,-1,-1,1,-1],
// 4 16 -1 1 1 1 1 1 1 1 -1 -1 1 -1
  [4,16,-1,1,1,1,1,1,1,1,-1,-1,1,-1],
// 4 16 -1 1 1 -1 0 1 1 0 1 1 1 1
  [4,16,-1,1,1,-1,0,1,1,0,1,1,1,1],
// 4 16 -1 1 -1 -1 0 -1 -1 0 1 -1 1 1
  [4,16,-1,1,-1,-1,0,-1,-1,0,1,-1,1,1],
// 4 16 1 1 -1 1 0 -1 -1 0 -1 -1 1 -1
  [4,16,1,1,-1,1,0,-1,-1,0,-1,-1,1,-1],
// 4 16 1 1 1 1 0 1 1 0 -1 1 1 -1
  [4,16,1,1,1,1,0,1,1,0,-1,1,1,-1],
];
module ldraw_lib__box5(step=0, col=false, unit=2/5, alt=false, line=0.2, solid=!$preview)
    makepoly(ldraw_lib__box5(solid), step=step, col=col, unit=unit, alt=alt, line=line, solid=solid);
ldraw_lib__box5(line=0.2);
// file: ../p/box4t.scad
use <../lib.scad>
$fa=1; $fs=0.2;
function ldraw_lib__box4t(realsolid=false) = [
// 0 Box with 4 Adjacent Faces and All Edges
// 0 Name: box4t.dat
// 0 Author: Tore Eriksson [Tore_Eriksson]
// 0 !LDRAW_ORG Primitive UPDATE 2003-02
// 0 !LICENSE Licensed under CC BY 2.0 and CC BY 4.0 : see CAreadme.txt
// 
// 0 BFC CERTIFY CCW
  [0,"BFC","CERTIFY"],
  [0,"BFC","CCW"],
// 
// 0 !HISTORY 1997-09-29 [PTadmin] Official Update 1997-15
// 0 !HISTORY 2002-08-31 [izanette] Modified with WINDZ for BFC compliance
// 0 !HISTORY 2003-08-01 [PTadmin] Official Update 2003-02
// 0 !HISTORY 2007-06-24 [PTadmin] Header formatted for Contributor Agreement
// 0 !HISTORY 2008-07-01 [PTadmin] Official Update 2008-01
// 
// 
// 2 24 1 1 1 -1 1 1
  [2,24,1,1,1,-1,1,1],
// 2 24 -1 1 1 -1 1 -1
  [2,24,-1,1,1,-1,1,-1],
// 2 24 -1 1 -1 1 1 -1
  [2,24,-1,1,-1,1,1,-1],
// 2 24 1 1 -1 1 1 1
  [2,24,1,1,-1,1,1,1],
// 2 24 1 0 1 -1 0 1
  [2,24,1,0,1,-1,0,1],
// 2 24 -1 0 1 -1 0 -1
  [2,24,-1,0,1,-1,0,-1],
// 2 24 -1 0 -1 1 0 -1
  [2,24,-1,0,-1,1,0,-1],
// 2 24 1 0 -1 1 0 1
  [2,24,1,0,-1,1,0,1],
// 2 24 1 0 1 1 1 1
  [2,24,1,0,1,1,1,1],
// 2 24 -1 0 1 -1 1 1
  [2,24,-1,0,1,-1,1,1],
// 2 24 1 0 -1 1 1 -1
  [2,24,1,0,-1,1,1,-1],
// 2 24 -1 0 -1 -1 1 -1
  [2,24,-1,0,-1,-1,1,-1],
// 4 16 1 1 1 1 1 -1 -1 1 -1 -1 1 1
  [4,16,1,1,1,1,1,-1,-1,1,-1,-1,1,1],
// 4 16 1 1 1 -1 1 1 -1 0 1 1 0 1
  [4,16,1,1,1,-1,1,1,-1,0,1,1,0,1],
// 4 16 -1 1 1 -1 1 -1 -1 0 -1 -1 0 1
  [4,16,-1,1,1,-1,1,-1,-1,0,-1,-1,0,1],
// 0 4 16 -1 1 -1 -1 0 -1 1 0 -1 1 1 -1
// 4 16 1 1 -1 1 1 1 1 0 1 1 0 -1
  [4,16,1,1,-1,1,1,1,1,0,1,1,0,-1],
// 0
];
module ldraw_lib__box4t(step=0, col=false, unit=2/5, alt=false, line=0.2, solid=!$preview)
    makepoly(ldraw_lib__box4t(solid), step=step, col=col, unit=unit, alt=alt, line=line, solid=solid);
ldraw_lib__box4t(line=0.2);
// file: 3004.scad
use <../lib.scad>
use <s/3004s01.scad>
$fa=1; $fs=0.2;
function ldraw_lib__3004(realsolid=false) = [
// 0 Brick  1 x  2
// 0 Name: 3004.dat
// 0 Author: James Jessiman
// 0 !LDRAW_ORG Part UPDATE 2022-05
// 0 !LICENSE Licensed under CC BY 2.0 and CC BY 4.0 : see CAreadme.txt
// 
// 0 BFC CERTIFY CCW
  [0,"BFC","CERTIFY"],
  [0,"BFC","CCW"],
// 
// 0 !HISTORY 2001-10-26 [PTadmin] Official Update 2001-01
// 0 !HISTORY 2002-05-07 {unknown} BFC Certification
// 0 !HISTORY 2002-06-11 [PTadmin] Official Update 2002-03
// 0 !HISTORY 2007-05-07 [PTadmin] Header formatted for Contributor Agreement
// 0 !HISTORY 2008-07-01 [PTadmin] Official Update 2008-01
// 0 !HISTORY 2022-08-04 [MagFors] Using subfile
// 0 !HISTORY 2022-09-15 [PTadmin] Official Update 2022-05
// 
// 
// 1 16 0 0 0 1 0 0 0 1 0 0 0 1 s\3004s01.dat
  [1,16,0,0,0,1,0,0,0,1,0,0,0,1, ldraw_lib__s__3004s01(realsolid)],
// 4 16 -20 24 -10 20 24 -10 20 0 -10 -20 0 -10
  [4,16,-20,24,-10,20,24,-10,20,0,-10,-20,0,-10],
];
module ldraw_lib__3004(step=0, col=false, unit=2/5, alt=false, line=0.2, solid=!$preview)
    makepoly(ldraw_lib__3004(solid), step=step, col=col, unit=unit, alt=alt, line=line, solid=solid);
ldraw_lib__3004(line=0.2);
// file: s/3005s01.scad
use <../../lib.scad>
use <../../p/box4t.scad>
use <../../p/box5.scad>
use <../../p/stud.scad>
$fa=1; $fs=0.2;
function ldraw_lib__s__3005s01(realsolid=false) = [
// 0 ~Brick  1 x  1 without Front Face
// 0 Name: s\3005s01.dat
// 0 Author: John Riley [jriley]
// 0 !LDRAW_ORG Subpart UPDATE 2004-01
// 0 !LICENSE Licensed under CC BY 2.0 and CC BY 4.0 : see CAreadme.txt
// 
// 0 BFC CERTIFY CCW
  [0,"BFC","CERTIFY"],
  [0,"BFC","CCW"],
// 
// 0 !HISTORY 2003-09-07 [jriley] BFCed & Subfiled
// 0 !HISTORY 2004-03-02 [PTadmin] Official Update 2004-01
// 0 !HISTORY 2007-08-29 [PTadmin] Header formatted for Contributor Agreement
// 0 !HISTORY 2008-07-01 [PTadmin] Official Update 2008-01
// 
// 
// 0 BFC INVERTNEXT
  [0,"BFC","INVERTNEXT"],
// 1 16 0 24 0 0 0 6 0 -20 0 -6 0 0 box5.dat
  [1,16,0,24,0,0,0,6,0,-20,0,-6,0,0, ldraw_lib__box5(realsolid)],
// 4 16 10 24 -10 6 24 -6 6 24 6 10 24 10
  [4,16,10,24,-10,6,24,-6,6,24,6,10,24,10],
// 4 16 10 24 10 6 24 6 -6 24 6 -10 24 10
  [4,16,10,24,10,6,24,6,-6,24,6,-10,24,10],
// 4 16 -10 24 10 -6 24 6 -6 24 -6 -10 24 -10
  [4,16,-10,24,10,-6,24,6,-6,24,-6,-10,24,-10],
// 4 16 -10 24 -10 -6 24 -6 6 24 -6 10 24 -10
  [4,16,-10,24,-10,-6,24,-6,6,24,-6,10,24,-10],
// 1 16 0 24 0 10 0 0 0 -24 0 0 0 10 box4t.dat
  [1,16,0,24,0,10,0,0,0,-24,0,0,0,10, ldraw_lib__box4t(realsolid)],
// 1 16 0 0 0 0 0 1 0 1 0 -1 0 0 stud.dat
  [1,16,0,0,0,0,0,1,0,1,0,-1,0,0, ldraw_lib__stud(realsolid)],
// 0
];
module ldraw_lib__s__3005s01(step=0, col=false, unit=2/5, alt=false, line=0.2, solid=!$preview)
    makepoly(ldraw_lib__s__3005s01(solid), step=step, col=col, unit=unit, alt=alt, line=line, solid=solid);
ldraw_lib__s__3005s01(line=0.2);
// main file
use <../lib.scad>
use <s/3005s01.scad>
$fa=1; $fs=0.2;
function ldraw_lib__3005ptf(realsolid=false) = [
// 0 Brick  1 x  1 with Blue "F" Pattern
// 0 Name: 3005ptf.dat
// 0 Author: Tore Eriksson [Tore_Eriksson]
// 0 !LDRAW_ORG Part UPDATE 2014-02
// 0 !LICENSE Licensed under CC BY 2.0 and CC BY 4.0 : see CAreadme.txt
// 
// 0 BFC CERTIFY CCW
  [0,"BFC","CERTIFY"],
  [0,"BFC","CCW"],
// 
// 0 !HISTORY 2003-12-09 [Steffen] made use of existing subfile
// 0 !HISTORY 2004-04-22 [PTadmin] Official Update 2004-02
// 0 !HISTORY 2007-05-11 [PTadmin] Header formatted for Contributor Agreement
// 0 !HISTORY 2008-07-01 [PTadmin] Official Update 2008-01
// 0 !HISTORY 2014-12-18 [Holly-Wood] Fixed T-Junction, BFCed
// 0 !HISTORY 2014-12-23 [PTadmin] Official Update 2014-02
// 
// 
// 0 // Pattern
// 
// 4 1 5 7 -10 5 5 -10 -5 5 -10 -3 7 -10
  [4,1,5,7,-10,5,5,-10,-5,5,-10,-3,7,-10],
// 3 1 -5 5 -10 -3 11 -10 -3 7 -10
  [3,1,-5,5,-10,-3,11,-10,-3,7,-10],
// 4 1 -3 13 -10 -3 11 -10 -5 5 -10 -5 19 -10
  [4,1,-3,13,-10,-3,11,-10,-5,5,-10,-5,19,-10],
// 4 1 3 13 -10 3 11 -10 -3 11 -10 -3 13 -10
  [4,1,3,13,-10,3,11,-10,-3,11,-10,-3,13,-10],
// 3 1 -3 13 -10 -5 19 -10 -3 19 -10
  [3,1,-3,13,-10,-5,19,-10,-3,19,-10],
// 4 16 5 5 -10 10 0 -10 -10 0 -10 -5 5 -10
  [4,16,5,5,-10,10,0,-10,-10,0,-10,-5,5,-10],
// 4 16 -5 5 -10 -10 0 -10 -10 24 -10 -5 19 -10
  [4,16,-5,5,-10,-10,0,-10,-10,24,-10,-5,19,-10],
// 4 16 -5 19 -10 -10 24 -10 10 24 -10 -3 19 -10
  [4,16,-5,19,-10,-10,24,-10,10,24,-10,-3,19,-10],
// 4 16 -3 13 -10 -3 19 -10 10 24 -10 3 13 -10
  [4,16,-3,13,-10,-3,19,-10,10,24,-10,3,13,-10],
// 4 16 3 11 -10 3 13 -10 10 24 -10 5 7 -10
  [4,16,3,11,-10,3,13,-10,10,24,-10,5,7,-10],
// 4 16 -3 7 -10 -3 11 -10 3 11 -10 5 7 -10
  [4,16,-3,7,-10,-3,11,-10,3,11,-10,5,7,-10],
// 4 16 5 7 -10 10 24 -10 10 0 -10 5 5 -10
  [4,16,5,7,-10,10,24,-10,10,0,-10,5,5,-10],
// 
// 0 // Subfile
// 1 16 0 0 0 1 0 0 0 1 0 0 0 1 s\3005s01.dat
  [1,16,0,0,0,1,0,0,0,1,0,0,0,1, ldraw_lib__s__3005s01(realsolid)],
];
module ldraw_lib__3005ptf(step=0, col=false, unit=2/5, alt=false, line=0.2, solid=!$preview)
    makepoly(ldraw_lib__3005ptf(solid), step=step, col=col, unit=unit, alt=alt, line=line, solid=solid);
ldraw_lib__3005ptf(line=0.2);
